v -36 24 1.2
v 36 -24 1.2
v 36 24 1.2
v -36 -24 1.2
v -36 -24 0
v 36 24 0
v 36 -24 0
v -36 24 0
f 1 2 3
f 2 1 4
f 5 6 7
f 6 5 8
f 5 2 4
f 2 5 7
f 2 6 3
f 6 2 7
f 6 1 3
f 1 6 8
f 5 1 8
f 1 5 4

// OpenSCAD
// Seed OpenSCAD file for task 03; complete it from 01_kicad_mechanical_map.csv.
$fn = 32;
board = [72.000, 48.000, 1.200];
wall = 2.200;
module placeholder_board() {
  translate([-board[0]/2, -board[1]/2, 0]) cube(board);
}
placeholder_board();
